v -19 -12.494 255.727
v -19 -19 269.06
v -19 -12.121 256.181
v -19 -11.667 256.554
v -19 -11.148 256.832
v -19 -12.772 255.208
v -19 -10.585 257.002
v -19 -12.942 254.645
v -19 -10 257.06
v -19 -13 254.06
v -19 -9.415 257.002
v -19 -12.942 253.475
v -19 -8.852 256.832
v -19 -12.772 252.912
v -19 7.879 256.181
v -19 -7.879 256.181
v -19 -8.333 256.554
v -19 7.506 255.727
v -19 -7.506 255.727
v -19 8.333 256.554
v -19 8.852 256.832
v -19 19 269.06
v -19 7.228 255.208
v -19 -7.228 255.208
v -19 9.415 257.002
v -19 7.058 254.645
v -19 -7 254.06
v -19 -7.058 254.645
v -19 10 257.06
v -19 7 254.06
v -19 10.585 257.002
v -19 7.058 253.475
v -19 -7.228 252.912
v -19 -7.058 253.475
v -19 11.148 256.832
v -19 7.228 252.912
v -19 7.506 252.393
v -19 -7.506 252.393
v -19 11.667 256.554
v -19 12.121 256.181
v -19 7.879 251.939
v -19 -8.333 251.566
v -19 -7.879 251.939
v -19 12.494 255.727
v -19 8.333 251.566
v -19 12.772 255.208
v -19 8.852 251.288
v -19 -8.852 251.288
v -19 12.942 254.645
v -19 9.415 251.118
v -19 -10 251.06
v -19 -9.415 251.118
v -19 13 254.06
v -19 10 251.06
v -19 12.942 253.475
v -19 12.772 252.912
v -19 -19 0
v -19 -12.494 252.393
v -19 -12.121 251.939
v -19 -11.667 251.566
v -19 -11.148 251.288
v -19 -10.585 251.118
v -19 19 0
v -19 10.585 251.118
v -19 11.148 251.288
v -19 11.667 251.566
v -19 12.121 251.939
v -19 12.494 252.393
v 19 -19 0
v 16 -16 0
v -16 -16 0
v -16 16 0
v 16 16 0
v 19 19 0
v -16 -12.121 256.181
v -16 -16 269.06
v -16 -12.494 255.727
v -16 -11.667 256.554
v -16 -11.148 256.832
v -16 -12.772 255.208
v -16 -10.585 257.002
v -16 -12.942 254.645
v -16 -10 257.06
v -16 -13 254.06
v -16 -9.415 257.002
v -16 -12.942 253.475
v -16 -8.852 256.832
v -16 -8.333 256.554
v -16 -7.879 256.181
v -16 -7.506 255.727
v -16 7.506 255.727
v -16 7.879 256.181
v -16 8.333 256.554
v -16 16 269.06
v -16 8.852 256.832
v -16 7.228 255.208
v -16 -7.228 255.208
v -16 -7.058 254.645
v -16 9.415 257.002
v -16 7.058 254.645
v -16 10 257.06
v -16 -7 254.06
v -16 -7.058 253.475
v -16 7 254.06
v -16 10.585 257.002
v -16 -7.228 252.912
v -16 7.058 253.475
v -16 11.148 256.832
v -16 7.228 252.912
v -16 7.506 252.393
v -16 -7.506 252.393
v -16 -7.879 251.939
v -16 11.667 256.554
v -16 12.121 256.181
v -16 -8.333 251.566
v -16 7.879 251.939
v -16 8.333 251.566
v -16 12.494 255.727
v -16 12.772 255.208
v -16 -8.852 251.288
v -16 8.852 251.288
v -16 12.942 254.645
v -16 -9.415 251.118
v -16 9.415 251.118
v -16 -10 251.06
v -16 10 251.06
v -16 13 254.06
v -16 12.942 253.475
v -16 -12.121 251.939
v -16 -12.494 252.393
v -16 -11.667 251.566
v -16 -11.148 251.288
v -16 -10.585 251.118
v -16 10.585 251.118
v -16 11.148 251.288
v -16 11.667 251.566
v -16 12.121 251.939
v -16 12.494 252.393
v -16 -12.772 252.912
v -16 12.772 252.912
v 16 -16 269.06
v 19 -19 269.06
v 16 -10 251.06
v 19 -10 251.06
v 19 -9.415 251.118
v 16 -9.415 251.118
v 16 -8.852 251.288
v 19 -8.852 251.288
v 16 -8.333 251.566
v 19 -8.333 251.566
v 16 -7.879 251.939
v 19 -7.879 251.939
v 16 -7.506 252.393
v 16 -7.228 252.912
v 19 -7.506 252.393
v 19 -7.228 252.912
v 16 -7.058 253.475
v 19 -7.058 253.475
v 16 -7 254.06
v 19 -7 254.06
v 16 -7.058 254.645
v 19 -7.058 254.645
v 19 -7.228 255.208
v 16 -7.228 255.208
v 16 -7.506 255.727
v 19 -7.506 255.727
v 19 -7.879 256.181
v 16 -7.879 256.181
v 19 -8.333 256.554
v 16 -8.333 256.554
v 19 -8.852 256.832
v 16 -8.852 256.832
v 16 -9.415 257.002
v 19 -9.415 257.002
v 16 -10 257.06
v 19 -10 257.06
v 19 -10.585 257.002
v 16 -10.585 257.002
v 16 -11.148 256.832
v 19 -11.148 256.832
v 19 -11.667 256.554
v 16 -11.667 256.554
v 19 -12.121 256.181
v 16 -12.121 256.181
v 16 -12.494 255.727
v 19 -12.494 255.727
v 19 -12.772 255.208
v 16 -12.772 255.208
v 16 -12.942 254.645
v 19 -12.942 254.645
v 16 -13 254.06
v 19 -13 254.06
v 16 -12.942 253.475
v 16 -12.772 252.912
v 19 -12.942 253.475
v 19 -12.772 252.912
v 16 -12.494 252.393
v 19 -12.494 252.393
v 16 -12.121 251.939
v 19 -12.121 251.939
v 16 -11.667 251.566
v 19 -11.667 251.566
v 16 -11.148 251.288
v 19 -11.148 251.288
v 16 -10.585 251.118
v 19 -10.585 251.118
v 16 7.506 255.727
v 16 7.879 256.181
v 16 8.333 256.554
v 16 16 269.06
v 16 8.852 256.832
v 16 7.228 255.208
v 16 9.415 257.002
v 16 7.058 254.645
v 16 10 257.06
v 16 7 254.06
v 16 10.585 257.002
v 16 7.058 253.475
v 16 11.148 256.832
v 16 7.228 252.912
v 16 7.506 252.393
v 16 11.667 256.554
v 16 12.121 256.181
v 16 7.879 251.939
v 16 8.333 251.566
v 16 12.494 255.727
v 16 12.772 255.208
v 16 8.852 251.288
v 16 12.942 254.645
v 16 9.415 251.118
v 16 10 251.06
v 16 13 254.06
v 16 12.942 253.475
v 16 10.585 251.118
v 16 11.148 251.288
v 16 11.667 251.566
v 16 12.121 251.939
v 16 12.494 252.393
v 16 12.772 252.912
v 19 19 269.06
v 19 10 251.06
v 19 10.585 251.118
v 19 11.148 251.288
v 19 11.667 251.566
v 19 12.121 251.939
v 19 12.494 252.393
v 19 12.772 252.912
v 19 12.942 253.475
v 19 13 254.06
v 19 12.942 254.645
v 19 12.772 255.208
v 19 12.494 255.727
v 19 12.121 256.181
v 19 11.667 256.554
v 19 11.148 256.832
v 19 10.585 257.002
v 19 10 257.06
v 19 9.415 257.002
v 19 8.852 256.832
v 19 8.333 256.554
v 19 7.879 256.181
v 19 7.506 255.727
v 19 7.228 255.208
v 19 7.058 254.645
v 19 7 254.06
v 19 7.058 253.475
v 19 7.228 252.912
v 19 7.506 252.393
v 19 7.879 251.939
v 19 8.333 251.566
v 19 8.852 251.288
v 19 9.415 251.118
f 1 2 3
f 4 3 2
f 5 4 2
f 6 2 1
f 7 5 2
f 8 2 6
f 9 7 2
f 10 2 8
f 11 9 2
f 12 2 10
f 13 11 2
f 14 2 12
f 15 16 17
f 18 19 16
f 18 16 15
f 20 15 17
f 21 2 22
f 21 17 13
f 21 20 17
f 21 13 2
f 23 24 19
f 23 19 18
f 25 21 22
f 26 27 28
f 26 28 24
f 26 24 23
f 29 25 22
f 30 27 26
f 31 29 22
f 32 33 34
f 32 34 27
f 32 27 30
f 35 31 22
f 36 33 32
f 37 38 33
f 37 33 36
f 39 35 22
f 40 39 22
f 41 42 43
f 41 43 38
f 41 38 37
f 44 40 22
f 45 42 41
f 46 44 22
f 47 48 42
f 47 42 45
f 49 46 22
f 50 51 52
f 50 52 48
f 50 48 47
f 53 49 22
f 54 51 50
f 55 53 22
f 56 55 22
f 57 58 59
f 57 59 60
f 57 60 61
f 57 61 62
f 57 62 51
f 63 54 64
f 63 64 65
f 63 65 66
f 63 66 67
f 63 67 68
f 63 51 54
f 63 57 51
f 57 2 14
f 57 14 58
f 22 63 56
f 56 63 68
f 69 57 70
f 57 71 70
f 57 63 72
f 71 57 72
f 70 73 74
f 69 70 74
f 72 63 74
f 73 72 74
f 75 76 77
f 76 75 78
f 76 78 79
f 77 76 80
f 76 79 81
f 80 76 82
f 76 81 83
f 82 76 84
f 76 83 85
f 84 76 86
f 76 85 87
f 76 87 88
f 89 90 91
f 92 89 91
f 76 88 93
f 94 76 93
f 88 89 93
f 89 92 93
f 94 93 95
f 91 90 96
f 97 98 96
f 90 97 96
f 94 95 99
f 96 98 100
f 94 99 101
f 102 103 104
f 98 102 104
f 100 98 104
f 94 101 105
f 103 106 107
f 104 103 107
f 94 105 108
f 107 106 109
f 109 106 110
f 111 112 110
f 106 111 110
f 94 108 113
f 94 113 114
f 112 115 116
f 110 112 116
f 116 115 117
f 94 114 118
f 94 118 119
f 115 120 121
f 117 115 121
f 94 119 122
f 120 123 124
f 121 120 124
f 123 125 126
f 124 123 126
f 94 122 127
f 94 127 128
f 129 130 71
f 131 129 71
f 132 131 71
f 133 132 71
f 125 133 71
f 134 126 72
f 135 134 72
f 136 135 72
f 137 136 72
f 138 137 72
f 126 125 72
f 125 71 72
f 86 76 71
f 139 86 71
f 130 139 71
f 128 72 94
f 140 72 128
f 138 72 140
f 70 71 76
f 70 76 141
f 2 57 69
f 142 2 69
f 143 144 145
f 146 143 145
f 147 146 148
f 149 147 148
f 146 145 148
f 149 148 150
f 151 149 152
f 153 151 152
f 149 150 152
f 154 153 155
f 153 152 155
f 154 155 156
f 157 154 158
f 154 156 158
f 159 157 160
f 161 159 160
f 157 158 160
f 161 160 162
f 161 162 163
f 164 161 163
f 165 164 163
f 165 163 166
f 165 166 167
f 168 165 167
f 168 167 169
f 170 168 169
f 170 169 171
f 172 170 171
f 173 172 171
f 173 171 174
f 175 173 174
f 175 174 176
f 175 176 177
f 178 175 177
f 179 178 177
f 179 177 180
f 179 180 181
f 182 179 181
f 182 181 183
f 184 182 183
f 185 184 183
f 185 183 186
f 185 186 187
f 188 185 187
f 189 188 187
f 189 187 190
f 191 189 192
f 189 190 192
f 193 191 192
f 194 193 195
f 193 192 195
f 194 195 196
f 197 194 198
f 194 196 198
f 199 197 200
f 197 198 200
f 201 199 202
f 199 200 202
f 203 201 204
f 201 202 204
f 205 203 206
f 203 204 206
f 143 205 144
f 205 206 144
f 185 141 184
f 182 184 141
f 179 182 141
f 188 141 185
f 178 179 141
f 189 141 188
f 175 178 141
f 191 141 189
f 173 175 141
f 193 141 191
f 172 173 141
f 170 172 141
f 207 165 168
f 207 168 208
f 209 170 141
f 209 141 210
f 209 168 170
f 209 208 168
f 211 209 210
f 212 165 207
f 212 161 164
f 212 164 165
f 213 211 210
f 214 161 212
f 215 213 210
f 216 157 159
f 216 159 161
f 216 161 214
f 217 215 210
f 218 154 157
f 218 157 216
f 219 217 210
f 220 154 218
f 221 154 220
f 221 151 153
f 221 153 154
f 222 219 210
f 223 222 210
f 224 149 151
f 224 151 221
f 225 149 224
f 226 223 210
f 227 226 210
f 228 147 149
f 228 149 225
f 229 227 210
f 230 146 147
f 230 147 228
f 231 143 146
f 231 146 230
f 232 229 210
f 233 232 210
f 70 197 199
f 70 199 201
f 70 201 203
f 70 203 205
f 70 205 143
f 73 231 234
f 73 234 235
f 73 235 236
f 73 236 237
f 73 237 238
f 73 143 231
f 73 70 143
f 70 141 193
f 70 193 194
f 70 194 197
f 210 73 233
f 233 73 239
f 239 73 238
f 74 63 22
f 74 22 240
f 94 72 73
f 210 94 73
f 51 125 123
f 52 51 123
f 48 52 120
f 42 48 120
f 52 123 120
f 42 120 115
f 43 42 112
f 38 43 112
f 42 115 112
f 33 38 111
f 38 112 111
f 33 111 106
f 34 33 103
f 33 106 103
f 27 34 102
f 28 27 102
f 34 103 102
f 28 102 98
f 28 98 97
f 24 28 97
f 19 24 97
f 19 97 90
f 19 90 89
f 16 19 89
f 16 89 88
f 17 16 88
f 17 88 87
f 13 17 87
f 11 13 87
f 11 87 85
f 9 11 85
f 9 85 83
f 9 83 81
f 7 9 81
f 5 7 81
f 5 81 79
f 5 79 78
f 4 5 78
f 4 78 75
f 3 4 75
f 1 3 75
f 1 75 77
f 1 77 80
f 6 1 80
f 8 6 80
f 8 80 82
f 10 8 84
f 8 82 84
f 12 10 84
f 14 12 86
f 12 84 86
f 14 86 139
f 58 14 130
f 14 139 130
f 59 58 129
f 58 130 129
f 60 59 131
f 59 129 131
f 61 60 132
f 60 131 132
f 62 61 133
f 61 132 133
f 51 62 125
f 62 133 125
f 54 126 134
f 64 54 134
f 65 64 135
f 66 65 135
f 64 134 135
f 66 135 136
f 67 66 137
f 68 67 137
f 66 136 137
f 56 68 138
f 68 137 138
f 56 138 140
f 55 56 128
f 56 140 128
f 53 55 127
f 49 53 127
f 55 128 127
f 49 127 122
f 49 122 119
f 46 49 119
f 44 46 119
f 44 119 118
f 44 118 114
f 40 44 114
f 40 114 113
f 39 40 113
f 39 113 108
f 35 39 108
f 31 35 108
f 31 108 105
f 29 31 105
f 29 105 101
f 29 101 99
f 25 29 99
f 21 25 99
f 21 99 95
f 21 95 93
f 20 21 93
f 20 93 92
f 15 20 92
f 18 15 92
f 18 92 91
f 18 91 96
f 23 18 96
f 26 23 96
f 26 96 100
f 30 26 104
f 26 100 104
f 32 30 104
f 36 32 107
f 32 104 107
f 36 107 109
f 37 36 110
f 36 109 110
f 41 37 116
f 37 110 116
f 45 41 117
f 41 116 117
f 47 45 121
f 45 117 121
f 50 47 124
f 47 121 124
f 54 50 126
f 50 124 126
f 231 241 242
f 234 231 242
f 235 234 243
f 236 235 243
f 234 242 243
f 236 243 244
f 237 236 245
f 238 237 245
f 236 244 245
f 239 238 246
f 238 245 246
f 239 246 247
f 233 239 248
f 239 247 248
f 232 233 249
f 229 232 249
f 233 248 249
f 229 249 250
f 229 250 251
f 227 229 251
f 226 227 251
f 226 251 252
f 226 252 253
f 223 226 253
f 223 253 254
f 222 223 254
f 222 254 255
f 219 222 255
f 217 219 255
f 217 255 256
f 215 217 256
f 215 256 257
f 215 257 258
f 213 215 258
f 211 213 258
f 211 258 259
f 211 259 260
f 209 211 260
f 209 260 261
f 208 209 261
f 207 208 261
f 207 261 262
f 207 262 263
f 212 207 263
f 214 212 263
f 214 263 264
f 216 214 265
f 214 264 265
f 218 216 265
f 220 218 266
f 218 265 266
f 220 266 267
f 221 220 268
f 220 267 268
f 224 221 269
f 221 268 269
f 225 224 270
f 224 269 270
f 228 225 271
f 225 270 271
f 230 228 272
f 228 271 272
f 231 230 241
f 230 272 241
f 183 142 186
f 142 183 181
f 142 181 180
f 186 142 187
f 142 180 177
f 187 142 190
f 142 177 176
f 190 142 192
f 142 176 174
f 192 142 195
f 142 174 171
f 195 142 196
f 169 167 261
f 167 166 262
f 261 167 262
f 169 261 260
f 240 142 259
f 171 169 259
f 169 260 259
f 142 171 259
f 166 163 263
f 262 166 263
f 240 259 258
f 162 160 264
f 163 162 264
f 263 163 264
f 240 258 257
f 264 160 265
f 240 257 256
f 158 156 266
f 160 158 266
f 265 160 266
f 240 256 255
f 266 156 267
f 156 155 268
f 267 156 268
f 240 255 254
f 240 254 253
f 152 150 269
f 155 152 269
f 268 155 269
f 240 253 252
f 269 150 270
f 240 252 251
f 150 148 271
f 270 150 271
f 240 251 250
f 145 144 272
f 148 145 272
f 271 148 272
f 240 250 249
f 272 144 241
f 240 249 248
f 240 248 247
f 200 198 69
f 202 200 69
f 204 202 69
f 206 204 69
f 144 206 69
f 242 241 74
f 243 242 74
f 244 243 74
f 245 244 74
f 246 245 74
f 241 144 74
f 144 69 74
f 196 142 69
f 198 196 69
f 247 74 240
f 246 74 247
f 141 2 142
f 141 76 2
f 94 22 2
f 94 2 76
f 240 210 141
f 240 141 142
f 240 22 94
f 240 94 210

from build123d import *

# Parameters (mm, degrees)
SKETCH1_W               = 38
SKETCH1_H               = 38
SKETCH1_W_2             = 32
SKETCH1_H_2             = 32
BOSS_EXTRUDE1_DEPTH     = 269.06
SKETCH2_R               = 3
CUT_EXTRUDE1_DEPTH      = 1
CUT_EXTRUDE1_DEPTH_BACK = 39


with BuildPart() as part:
    # Sketch1 → Boss-Extrude1 (new body)
    with BuildSketch(Plane.XY):
        Rectangle(SKETCH1_W, SKETCH1_H)
        Rectangle(SKETCH1_W_2, SKETCH1_H_2, mode=Mode.SUBTRACT)
    extrude(amount=BOSS_EXTRUDE1_DEPTH)

    # Sketch2 → Cut-Extrude1 (cut, two sides)
    with BuildSketch(Plane(origin=(19, 0, 0), x_dir=(0, 0, -1), z_dir=(1, 0, 0))) as cut_extrude1_sk:
        with Locations((-254.06, 10)):
            Circle(SKETCH2_R)
        with Locations((-254.06, -10)):
            Circle(SKETCH2_R)
    extrude(amount=CUT_EXTRUDE1_DEPTH, mode=Mode.SUBTRACT)
    extrude(cut_extrude1_sk.sketch, amount=-CUT_EXTRUDE1_DEPTH_BACK, mode=Mode.SUBTRACT)


solid = part.part
